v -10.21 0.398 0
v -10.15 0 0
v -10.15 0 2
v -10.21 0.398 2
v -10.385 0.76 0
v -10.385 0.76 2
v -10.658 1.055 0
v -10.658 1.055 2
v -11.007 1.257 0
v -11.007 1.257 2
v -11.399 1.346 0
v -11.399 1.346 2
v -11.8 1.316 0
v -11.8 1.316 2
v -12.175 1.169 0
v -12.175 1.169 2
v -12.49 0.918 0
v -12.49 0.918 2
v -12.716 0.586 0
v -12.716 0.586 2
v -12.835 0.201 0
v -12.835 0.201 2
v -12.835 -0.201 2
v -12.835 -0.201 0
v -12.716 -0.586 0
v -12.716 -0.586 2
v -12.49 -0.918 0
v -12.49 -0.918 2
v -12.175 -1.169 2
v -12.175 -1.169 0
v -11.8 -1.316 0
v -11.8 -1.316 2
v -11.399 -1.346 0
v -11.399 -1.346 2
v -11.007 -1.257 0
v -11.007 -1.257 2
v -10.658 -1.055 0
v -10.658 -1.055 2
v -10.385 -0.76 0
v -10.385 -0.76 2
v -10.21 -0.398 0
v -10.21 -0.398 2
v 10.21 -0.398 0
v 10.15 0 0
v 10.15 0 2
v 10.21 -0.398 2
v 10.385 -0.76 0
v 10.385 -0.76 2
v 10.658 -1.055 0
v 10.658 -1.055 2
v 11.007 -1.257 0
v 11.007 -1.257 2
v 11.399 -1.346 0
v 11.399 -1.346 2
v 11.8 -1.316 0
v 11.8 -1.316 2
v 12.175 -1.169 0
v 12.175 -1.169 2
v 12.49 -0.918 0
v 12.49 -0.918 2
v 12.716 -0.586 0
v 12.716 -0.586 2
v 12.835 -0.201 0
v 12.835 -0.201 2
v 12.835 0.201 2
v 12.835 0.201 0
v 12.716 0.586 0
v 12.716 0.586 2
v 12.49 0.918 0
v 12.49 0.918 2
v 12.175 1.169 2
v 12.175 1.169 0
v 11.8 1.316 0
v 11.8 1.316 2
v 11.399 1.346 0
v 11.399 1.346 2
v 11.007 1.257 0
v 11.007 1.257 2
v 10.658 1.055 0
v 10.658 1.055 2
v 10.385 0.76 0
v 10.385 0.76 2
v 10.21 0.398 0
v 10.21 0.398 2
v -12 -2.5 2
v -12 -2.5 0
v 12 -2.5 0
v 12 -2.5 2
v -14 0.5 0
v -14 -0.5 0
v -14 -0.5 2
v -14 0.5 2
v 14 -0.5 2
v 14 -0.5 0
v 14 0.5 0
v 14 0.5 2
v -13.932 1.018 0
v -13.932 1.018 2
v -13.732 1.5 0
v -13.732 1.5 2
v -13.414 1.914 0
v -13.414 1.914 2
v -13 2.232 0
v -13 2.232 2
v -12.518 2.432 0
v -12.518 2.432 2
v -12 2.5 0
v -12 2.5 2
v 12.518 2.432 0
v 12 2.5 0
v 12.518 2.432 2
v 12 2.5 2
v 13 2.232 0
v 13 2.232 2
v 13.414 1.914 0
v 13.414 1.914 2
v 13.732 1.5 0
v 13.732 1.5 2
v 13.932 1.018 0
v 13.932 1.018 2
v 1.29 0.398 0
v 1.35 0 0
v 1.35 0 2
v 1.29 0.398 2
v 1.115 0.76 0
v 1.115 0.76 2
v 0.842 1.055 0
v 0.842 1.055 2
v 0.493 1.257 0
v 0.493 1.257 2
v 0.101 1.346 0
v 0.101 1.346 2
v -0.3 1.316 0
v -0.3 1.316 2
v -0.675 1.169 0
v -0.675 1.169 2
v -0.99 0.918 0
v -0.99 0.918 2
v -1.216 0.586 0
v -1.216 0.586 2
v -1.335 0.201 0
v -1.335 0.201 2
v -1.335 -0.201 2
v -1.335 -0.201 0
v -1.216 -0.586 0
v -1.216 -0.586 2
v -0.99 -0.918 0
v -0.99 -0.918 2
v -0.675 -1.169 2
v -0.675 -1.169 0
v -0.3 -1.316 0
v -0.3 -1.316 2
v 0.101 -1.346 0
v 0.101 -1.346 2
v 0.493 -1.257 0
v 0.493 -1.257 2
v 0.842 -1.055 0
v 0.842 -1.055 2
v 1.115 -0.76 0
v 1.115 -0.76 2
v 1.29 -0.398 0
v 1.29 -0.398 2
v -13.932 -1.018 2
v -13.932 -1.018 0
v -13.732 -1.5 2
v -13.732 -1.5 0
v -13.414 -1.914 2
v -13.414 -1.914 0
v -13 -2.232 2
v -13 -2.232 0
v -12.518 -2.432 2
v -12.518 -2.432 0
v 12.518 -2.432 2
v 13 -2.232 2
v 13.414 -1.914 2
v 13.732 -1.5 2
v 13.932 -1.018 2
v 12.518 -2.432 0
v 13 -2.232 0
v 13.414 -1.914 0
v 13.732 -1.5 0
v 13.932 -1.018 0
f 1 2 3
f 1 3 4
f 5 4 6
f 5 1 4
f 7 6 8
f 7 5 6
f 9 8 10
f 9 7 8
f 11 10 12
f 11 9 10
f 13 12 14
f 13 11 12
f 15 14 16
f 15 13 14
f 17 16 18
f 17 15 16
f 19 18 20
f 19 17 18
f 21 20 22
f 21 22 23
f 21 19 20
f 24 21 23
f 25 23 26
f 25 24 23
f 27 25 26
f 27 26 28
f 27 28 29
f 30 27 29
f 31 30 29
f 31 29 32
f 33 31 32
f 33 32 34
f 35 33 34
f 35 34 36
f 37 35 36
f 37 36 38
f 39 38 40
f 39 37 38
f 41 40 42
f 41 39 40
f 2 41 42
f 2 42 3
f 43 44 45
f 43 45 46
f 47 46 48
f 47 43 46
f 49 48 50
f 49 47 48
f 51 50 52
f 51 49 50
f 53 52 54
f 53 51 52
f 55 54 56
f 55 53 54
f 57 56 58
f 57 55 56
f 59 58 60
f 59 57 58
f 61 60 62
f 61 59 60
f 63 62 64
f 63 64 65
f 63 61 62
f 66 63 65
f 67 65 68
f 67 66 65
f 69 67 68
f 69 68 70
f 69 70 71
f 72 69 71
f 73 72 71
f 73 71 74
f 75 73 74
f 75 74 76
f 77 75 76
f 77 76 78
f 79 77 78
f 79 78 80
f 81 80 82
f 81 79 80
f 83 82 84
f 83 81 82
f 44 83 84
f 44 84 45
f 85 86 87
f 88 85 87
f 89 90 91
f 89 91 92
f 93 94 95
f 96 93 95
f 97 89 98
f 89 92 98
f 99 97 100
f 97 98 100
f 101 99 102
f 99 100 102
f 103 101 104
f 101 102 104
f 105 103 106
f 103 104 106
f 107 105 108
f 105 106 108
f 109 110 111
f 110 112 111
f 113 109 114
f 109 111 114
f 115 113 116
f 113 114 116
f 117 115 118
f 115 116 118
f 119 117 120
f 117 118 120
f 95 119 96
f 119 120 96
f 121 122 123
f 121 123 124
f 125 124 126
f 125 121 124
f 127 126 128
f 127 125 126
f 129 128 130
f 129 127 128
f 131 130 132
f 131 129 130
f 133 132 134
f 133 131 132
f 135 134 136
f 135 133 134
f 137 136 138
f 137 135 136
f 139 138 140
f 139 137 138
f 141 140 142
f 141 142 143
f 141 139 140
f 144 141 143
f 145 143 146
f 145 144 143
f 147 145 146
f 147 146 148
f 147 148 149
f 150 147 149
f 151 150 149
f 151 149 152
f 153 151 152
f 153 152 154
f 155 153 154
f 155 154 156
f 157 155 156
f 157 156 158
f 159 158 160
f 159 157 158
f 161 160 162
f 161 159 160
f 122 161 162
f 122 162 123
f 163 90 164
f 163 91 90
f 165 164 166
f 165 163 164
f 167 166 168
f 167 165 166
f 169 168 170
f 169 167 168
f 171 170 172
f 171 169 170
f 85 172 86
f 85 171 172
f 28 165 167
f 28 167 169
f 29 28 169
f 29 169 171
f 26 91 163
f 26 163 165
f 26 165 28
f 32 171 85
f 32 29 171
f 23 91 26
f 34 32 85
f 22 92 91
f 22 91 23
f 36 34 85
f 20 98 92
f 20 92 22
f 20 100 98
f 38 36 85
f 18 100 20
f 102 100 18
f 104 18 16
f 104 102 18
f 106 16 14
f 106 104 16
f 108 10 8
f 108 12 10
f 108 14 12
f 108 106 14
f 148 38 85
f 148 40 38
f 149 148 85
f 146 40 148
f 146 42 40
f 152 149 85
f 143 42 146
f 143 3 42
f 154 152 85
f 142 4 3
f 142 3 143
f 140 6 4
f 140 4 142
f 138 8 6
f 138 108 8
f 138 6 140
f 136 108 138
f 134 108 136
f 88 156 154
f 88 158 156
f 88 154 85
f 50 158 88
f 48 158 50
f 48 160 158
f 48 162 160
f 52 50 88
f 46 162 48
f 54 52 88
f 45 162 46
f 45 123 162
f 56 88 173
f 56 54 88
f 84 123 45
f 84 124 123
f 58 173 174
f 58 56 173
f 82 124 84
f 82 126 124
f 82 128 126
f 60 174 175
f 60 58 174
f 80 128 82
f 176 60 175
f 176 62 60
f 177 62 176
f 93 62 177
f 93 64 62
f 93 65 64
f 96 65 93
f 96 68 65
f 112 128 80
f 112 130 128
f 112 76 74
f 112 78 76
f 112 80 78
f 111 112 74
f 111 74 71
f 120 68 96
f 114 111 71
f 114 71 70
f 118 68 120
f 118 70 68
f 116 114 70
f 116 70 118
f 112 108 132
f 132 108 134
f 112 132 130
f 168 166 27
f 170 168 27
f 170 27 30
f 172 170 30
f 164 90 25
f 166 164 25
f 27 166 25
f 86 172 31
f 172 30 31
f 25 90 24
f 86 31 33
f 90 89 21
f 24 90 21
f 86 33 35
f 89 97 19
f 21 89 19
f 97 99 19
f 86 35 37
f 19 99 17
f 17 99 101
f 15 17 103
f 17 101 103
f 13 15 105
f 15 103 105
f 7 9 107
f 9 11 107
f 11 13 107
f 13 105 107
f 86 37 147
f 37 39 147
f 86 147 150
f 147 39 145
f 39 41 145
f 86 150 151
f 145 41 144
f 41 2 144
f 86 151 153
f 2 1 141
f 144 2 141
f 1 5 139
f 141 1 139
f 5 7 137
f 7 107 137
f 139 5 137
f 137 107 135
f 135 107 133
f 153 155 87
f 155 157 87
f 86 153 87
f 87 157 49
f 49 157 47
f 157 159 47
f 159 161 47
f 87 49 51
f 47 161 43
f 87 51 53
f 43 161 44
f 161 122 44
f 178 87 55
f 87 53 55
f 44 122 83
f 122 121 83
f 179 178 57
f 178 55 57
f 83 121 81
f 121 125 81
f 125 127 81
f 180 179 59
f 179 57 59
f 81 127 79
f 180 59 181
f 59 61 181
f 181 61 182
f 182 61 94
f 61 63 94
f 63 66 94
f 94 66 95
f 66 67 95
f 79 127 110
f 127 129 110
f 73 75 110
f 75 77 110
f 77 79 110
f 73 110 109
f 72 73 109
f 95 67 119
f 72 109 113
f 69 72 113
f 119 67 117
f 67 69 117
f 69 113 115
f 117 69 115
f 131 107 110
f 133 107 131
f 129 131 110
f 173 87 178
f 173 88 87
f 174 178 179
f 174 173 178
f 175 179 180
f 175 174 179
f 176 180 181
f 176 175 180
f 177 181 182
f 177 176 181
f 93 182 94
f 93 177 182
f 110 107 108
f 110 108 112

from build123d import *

# Parameters (mm, degrees)
SKETCH_1_W      = 28
SKETCH_1_H      = 5
SKETCH_1_R      = 1.35
EXTRUDE_1_DEPTH = 2
FILLET_1_R      = 2


with BuildPart() as part:
    # 草图1 → 凸台-拉伸1 (new body)
    with BuildSketch(Plane.XY):
        Rectangle(SKETCH_1_W, SKETCH_1_H)
        with Locations((-11.5, 0)):
            Circle(SKETCH_1_R, mode=Mode.SUBTRACT)
        with Locations(Location((11.5, 0, 0), (0, 0, 180))):
            Circle(SKETCH_1_R, mode=Mode.SUBTRACT)
        Circle(SKETCH_1_R, mode=Mode.SUBTRACT)
    extrude(amount=EXTRUDE_1_DEPTH)

    # 圆角1
    fillet_1_edges = [part.edges().sort_by_distance(p)[0] for p in [
        (14, -2.5, 1),
        (-14, -2.5, 1),
        (-14, 2.5, 1),
        (14, 2.5, 1),
    ]]
    fillet(fillet_1_edges, radius=FILLET_1_R)


solid = part.part
